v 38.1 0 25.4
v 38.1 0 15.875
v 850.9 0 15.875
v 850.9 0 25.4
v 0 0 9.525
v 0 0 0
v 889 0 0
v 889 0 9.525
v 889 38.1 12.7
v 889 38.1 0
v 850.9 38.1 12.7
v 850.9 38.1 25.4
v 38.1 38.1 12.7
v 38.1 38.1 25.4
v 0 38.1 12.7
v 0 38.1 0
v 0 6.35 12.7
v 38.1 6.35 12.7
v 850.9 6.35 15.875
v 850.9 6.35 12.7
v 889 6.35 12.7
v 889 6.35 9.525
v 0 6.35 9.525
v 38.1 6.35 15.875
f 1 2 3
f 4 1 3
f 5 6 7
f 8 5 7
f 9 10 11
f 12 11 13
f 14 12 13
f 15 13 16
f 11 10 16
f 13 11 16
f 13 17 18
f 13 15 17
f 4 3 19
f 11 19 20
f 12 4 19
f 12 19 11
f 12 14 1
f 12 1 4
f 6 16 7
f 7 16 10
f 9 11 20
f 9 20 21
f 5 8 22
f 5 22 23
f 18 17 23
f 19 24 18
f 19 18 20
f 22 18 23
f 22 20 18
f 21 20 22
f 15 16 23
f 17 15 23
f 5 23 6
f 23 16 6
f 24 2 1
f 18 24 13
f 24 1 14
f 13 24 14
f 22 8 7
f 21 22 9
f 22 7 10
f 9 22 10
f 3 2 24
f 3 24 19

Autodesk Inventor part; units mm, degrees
ref_plane "YZ Plane" through (0, 0, 0) normal (1, 0, 0) x (0, 1, 0)
ref_plane "XZ Plane" through (0, 0, 0) normal (0, 1, 0) x (-1, 0, 0)
ref_plane "XY Plane" through (0, 0, 0) normal (0, 0, 1) x (1, 0, 0)
sketch "Sketch1" plane through (0, 0, 0) normal (0, 0, 1) x (1, 0, 0)
  line L0 (0, 0) -> (889, 0)
  line L1 (889, 0) -> (889, 38.1)
  line L2 (889, 38.1) -> (0, 38.1)
  line L3 (0, 38.1) -> (0, 0)
  dimension "d0" = 889
  dimension "d1" = 38.1
extrude "Extrusion1" add sketch "Sketch1" along normal blind 25.4
sketch "Sketch2" plane through (0, 0, 25.4) normal (0, 0, 1) x (1, 0, 0)
  line L0 (0, 38.1) -> (0, 0) projected
  line L1 (0, 0) -> (38.1, 0)
  line L2 (38.1, 0) -> (38.1, 38.1)
  line L3 (38.1, 38.1) -> (0, 38.1)
  line L4 (0, 38.1) -> (0, 0)
  line L5 (0, 0) -> (889, 0) projected
  line L6 (889, 0) -> (850.9, 0)
  line L7 (850.9, 0) -> (850.9, 38.1)
  line L8 (850.9, 38.1) -> (889, 38.1)
  line L9 (889, 38.1) -> (889, 0)
  dimension "d4" = 38.1
  dimension "d5" = 38.1
  dimension "d6" = 38.1
  dimension "d7" = 38.1
extrude "Extrusion2" cut sketch "Sketch2" against normal blind 12.7 contours L7 L8 L9 L5
sketch "Sketch5" plane through (0, 0, 25.4) normal (0, 0, 1) x (1, 0, 0)
  line L0 (0, 0) -> (38.1, 0)
  line L1 (38.1, 0) -> (38.1, 38.1)
  line L2 (38.1, 38.1) -> (0, 38.1)
  line L3 (0, 38.1) -> (0, 0)
  dimension "d10" = 38.1
  dimension "d11" = 38.1
extrude "Extrusion3" cut sketch "Sketch5" against normal blind 12.7
sketch "Sketch6" plane through (0, 0, 0) normal (0, -1, 0) x (1, 0, 0)
  line L0 (850.9, 12.7) -> (889, 12.7) projected
  line L1 (889, 12.7) -> (889, 9.525)
  line L2 (889, 0) -> (889, 12.7) projected
  line L3 (889, 9.525) -> (0, 9.525)
  line L4 (0, 9.525) -> (0, 15.875)
  line L5 (0, 15.875) -> (889, 15.875)
  line L6 (889, 15.875) -> (889, 12.7)
  dimension "d24" = 3.175
  dimension "d25" = 889
  dimension "d26" = 6.35
  dimension "d27" = 889
extrude "Extrusion4" cut sketch "Sketch6" against normal blind 6.35
properties part number "topv2" material "Wood (Cherry)"
